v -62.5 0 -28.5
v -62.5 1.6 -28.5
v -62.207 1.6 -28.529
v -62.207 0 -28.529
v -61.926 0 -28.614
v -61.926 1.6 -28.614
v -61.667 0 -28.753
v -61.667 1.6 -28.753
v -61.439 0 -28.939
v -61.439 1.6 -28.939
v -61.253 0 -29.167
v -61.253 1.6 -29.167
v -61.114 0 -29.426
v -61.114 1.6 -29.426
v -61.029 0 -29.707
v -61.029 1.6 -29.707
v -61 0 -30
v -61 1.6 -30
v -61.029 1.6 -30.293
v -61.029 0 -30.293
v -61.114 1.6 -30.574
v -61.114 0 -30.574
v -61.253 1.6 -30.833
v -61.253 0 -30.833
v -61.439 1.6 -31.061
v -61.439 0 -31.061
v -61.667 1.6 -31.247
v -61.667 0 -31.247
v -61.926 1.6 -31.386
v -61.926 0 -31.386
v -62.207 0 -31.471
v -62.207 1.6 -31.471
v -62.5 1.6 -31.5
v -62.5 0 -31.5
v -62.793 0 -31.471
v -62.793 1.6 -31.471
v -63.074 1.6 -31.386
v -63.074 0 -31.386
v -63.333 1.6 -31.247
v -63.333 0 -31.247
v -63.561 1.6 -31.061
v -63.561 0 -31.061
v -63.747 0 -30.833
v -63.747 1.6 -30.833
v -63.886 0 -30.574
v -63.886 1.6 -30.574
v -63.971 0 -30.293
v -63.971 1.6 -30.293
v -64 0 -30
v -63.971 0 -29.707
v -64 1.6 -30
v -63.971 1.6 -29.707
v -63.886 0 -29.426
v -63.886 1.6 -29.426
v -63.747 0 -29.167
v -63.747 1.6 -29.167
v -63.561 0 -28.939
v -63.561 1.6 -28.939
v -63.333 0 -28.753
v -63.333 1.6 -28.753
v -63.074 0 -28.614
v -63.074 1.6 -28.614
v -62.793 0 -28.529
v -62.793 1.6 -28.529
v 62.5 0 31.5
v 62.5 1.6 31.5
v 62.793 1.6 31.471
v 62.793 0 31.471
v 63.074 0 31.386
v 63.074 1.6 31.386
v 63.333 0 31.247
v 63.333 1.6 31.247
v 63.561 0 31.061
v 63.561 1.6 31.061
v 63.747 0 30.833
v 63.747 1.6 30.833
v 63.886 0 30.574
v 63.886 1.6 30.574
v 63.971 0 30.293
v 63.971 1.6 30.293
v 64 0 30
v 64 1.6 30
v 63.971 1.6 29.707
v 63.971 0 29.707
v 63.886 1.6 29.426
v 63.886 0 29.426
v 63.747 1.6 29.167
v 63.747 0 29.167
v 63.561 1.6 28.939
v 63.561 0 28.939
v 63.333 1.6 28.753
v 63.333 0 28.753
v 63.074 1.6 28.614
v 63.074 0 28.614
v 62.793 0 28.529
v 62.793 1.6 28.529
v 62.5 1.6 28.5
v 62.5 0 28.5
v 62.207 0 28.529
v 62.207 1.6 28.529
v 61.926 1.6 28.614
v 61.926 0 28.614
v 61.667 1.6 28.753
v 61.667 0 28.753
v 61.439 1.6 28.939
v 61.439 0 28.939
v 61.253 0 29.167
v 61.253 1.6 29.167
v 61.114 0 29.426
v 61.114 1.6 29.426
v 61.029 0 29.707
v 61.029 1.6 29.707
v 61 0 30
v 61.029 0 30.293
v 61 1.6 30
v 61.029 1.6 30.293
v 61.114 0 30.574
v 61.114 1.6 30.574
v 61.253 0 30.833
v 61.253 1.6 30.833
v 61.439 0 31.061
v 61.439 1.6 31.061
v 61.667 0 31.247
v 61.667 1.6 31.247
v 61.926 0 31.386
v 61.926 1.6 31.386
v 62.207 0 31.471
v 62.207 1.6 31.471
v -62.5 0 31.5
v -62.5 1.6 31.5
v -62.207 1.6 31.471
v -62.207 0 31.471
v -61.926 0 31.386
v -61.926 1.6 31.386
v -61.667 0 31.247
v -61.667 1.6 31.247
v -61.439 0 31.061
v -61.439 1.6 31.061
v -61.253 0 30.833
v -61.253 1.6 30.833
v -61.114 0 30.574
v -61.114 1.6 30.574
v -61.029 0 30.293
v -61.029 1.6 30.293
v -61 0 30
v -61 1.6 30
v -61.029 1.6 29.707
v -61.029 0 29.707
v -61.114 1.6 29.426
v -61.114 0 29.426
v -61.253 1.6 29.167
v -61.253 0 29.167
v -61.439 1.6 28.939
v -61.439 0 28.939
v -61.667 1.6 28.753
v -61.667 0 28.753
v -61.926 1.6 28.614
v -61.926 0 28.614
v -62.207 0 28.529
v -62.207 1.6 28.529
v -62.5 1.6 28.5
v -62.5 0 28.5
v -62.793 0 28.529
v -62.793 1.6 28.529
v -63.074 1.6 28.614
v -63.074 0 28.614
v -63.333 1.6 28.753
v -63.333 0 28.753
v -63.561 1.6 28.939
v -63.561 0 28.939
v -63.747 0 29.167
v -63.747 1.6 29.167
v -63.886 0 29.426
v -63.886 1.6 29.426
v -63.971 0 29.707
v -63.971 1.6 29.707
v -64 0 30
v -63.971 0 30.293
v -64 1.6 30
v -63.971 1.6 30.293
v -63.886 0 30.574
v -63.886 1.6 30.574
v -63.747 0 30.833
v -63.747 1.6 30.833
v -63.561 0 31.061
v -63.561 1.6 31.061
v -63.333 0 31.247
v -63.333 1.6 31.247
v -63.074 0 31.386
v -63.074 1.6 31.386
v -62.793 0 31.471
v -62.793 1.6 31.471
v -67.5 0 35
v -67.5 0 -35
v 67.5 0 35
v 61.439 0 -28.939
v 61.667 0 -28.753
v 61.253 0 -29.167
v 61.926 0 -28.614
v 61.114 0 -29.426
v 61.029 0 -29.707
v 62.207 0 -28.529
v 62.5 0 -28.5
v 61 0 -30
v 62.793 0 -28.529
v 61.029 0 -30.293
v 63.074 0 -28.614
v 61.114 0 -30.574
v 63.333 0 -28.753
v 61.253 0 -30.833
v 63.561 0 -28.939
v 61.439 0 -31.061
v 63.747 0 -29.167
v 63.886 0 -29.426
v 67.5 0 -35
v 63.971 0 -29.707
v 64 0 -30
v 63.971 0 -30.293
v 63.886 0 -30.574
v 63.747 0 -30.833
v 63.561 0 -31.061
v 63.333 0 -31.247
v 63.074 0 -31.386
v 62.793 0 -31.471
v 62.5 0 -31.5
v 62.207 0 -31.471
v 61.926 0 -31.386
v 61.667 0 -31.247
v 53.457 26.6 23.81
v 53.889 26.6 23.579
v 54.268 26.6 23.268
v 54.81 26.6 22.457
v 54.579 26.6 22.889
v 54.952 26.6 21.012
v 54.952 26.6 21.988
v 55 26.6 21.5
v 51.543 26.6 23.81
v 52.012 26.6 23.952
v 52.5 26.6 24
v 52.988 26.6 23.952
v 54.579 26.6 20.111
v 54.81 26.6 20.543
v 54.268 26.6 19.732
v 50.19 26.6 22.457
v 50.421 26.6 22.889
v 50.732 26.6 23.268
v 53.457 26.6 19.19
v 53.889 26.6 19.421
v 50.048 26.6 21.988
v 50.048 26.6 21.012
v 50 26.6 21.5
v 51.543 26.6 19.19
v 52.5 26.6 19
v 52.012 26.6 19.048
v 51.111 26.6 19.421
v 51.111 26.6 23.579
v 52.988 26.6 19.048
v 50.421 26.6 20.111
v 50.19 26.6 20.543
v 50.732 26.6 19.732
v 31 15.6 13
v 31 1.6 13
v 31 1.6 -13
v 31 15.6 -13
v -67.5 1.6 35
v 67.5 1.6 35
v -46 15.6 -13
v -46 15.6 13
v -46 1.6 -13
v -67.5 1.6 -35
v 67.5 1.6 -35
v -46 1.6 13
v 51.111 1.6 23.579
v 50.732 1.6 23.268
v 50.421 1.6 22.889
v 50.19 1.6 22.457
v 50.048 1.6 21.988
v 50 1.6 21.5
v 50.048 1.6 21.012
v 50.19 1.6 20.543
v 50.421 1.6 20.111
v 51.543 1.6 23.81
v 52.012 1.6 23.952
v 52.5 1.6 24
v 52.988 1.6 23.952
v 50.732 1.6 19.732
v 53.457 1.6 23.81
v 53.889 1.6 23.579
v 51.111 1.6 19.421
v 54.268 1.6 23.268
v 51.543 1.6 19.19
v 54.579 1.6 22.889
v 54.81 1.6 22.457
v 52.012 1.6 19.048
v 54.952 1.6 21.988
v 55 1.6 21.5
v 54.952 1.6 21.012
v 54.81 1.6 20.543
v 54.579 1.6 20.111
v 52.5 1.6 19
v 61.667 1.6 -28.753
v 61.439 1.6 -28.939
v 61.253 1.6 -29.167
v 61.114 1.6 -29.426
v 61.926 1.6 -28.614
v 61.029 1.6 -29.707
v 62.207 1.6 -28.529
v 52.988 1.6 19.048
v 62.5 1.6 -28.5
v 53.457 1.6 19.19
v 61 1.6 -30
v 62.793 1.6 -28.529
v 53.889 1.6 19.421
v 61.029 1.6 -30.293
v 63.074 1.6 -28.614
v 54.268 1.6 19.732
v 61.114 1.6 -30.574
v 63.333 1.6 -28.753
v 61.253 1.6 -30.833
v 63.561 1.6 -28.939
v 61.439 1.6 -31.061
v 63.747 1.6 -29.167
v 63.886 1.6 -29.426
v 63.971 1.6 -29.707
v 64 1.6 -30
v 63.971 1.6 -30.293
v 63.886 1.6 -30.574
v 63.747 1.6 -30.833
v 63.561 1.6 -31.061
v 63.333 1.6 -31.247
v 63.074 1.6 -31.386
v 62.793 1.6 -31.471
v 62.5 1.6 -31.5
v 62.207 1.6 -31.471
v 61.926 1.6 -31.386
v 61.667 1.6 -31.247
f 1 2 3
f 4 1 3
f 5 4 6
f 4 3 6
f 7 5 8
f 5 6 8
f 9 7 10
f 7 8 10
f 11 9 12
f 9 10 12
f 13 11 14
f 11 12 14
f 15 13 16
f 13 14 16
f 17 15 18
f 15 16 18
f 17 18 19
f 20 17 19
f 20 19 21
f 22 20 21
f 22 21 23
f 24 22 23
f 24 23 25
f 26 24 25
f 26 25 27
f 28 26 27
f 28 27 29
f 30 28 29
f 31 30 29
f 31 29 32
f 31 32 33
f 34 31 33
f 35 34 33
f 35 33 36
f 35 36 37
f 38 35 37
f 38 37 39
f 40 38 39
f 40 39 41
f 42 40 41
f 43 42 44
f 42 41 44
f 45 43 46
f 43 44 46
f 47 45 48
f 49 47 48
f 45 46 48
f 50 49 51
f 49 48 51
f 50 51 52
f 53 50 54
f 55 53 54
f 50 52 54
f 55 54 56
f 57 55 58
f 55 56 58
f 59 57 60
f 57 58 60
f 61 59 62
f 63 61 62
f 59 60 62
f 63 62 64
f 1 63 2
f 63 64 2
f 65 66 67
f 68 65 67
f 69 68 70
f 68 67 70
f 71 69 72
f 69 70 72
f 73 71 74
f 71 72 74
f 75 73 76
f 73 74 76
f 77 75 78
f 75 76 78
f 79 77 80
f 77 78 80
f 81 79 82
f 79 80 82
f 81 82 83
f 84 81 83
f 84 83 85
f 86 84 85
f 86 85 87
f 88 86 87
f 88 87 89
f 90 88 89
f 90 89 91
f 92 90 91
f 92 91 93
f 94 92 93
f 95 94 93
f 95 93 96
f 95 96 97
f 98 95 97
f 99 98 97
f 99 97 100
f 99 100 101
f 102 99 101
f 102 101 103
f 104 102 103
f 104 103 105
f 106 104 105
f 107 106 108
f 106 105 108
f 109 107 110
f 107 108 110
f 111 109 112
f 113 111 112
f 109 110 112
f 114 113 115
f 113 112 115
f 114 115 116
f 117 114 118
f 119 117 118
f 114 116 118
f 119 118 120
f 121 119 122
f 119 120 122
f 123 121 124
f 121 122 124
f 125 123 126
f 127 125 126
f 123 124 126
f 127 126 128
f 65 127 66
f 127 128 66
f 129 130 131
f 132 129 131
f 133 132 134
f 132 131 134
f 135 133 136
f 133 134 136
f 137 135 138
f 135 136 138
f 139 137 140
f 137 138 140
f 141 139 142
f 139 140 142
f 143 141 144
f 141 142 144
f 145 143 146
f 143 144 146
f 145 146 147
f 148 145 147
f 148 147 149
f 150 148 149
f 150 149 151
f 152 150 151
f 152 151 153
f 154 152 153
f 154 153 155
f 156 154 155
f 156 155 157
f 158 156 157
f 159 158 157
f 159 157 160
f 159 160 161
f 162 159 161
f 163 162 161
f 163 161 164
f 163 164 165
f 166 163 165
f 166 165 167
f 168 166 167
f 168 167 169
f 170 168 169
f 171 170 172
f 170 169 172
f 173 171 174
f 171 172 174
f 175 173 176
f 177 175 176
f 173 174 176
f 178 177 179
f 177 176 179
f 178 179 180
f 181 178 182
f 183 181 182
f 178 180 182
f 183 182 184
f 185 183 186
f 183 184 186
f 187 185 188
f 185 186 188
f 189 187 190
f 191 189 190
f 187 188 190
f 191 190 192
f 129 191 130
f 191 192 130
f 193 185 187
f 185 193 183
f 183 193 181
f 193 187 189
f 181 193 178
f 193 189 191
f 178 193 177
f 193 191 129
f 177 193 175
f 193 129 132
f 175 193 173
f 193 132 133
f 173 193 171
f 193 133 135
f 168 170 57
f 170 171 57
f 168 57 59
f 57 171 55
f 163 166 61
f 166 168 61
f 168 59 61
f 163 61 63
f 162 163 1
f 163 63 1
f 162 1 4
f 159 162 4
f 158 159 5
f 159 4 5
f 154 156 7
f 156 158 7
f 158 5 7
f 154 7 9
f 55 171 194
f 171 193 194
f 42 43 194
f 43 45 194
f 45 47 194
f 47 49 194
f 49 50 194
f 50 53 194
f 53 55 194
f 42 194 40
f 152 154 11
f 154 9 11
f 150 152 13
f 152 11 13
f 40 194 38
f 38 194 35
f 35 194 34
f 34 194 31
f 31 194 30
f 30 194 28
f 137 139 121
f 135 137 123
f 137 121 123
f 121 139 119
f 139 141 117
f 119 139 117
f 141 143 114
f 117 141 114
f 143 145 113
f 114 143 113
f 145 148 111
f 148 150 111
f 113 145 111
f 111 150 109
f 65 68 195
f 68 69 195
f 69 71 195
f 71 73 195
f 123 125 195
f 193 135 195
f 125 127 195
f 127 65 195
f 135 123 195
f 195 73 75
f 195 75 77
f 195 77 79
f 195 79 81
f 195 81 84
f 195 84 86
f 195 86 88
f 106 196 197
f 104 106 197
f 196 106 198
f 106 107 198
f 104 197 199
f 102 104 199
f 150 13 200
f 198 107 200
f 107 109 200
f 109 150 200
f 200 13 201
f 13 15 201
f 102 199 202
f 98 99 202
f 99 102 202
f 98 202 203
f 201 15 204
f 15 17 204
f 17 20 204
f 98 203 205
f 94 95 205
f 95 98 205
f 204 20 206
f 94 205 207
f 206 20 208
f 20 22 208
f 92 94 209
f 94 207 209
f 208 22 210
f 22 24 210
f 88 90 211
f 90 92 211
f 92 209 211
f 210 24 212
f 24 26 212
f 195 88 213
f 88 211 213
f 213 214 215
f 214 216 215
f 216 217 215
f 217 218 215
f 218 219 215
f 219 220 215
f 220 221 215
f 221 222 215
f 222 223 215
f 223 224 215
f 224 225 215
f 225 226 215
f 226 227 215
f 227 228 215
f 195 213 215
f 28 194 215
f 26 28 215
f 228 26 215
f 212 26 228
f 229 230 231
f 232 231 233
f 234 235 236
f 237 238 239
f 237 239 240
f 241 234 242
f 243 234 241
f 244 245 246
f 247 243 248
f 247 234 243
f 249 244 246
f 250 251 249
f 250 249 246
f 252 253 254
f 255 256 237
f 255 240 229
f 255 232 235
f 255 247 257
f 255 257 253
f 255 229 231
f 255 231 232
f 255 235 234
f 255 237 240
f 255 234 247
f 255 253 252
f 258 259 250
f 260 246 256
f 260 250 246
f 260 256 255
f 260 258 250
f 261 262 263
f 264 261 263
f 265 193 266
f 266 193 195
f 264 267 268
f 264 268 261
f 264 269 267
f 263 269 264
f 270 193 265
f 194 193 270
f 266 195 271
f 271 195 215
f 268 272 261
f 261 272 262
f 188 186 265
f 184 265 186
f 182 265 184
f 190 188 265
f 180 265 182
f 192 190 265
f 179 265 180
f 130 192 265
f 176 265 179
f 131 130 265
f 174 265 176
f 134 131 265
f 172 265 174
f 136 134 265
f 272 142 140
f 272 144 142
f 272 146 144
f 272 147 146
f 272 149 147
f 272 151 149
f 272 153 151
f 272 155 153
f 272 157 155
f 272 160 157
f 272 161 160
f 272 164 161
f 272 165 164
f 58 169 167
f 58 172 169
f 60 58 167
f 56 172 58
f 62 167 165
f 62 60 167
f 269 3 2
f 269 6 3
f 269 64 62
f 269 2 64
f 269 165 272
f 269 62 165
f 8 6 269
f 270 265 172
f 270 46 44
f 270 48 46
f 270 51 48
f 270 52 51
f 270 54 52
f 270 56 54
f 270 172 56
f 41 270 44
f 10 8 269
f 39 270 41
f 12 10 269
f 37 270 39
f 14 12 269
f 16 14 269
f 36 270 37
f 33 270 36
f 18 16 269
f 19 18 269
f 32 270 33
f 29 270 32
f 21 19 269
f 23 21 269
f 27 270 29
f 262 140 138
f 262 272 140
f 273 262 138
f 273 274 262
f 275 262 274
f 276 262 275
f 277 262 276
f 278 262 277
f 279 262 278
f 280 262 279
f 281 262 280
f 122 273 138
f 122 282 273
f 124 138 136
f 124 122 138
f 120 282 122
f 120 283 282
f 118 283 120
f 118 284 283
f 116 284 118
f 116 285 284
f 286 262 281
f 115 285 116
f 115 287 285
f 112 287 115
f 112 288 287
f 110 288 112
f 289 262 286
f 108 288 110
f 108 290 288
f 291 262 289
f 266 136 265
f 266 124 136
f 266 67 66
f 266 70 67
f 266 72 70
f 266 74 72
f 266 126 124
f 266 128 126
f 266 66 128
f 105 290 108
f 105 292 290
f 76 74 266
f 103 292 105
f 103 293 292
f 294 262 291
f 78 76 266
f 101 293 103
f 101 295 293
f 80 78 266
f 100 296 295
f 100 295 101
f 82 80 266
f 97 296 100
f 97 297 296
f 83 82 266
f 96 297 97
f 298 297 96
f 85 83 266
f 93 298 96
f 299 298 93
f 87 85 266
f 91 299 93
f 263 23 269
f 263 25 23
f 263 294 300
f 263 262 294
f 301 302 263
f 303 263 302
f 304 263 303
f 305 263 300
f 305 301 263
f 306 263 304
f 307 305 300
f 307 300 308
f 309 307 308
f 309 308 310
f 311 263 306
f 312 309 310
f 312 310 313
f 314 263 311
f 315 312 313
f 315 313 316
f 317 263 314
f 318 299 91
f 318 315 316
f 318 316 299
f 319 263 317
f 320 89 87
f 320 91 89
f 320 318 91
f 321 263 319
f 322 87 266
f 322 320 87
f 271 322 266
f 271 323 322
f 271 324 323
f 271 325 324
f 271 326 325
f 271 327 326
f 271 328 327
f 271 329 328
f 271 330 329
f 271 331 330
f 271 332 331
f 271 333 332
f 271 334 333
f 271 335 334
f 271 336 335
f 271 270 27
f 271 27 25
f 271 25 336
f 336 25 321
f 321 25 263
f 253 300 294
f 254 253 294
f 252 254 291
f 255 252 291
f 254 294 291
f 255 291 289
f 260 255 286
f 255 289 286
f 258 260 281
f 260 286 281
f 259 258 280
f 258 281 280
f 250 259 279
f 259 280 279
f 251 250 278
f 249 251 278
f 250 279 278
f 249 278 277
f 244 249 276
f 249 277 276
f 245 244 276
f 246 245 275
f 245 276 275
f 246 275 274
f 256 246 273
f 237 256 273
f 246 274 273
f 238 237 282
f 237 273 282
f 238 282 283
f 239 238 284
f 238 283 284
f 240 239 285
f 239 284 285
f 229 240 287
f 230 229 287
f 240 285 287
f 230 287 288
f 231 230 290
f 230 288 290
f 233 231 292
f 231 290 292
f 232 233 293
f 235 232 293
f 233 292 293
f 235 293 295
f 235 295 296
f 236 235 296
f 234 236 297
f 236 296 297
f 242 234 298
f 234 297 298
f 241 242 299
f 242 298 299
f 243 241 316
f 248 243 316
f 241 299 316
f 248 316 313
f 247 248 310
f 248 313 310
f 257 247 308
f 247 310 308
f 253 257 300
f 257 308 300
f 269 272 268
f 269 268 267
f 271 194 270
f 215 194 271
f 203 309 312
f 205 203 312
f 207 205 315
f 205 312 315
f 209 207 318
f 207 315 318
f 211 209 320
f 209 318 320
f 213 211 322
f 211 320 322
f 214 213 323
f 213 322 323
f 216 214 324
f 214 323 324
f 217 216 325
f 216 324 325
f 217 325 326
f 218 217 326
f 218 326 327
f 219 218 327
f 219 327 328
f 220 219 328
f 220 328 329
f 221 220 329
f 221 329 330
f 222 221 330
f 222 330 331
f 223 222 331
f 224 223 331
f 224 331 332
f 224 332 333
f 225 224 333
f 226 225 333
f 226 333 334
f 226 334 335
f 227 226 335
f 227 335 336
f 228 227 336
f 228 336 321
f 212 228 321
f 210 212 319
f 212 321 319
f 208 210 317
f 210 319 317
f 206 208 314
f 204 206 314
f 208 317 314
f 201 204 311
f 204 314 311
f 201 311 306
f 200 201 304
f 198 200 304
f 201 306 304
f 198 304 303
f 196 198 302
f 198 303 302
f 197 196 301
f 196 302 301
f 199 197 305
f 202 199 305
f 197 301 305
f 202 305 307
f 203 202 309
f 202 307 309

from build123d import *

# Parameters (mm, degrees)
SKETCH1_W           = 135
SKETCH1_H           = 70
BOSS_EXTRUDE1_DEPTH = 1.6
CUT_EXTRUDE1_REACH  = 78.051
SKETCH2_R           = 1.5
SKETCH3_R           = 2.5
BOSS_EXTRUDE2_DEPTH = 25
SKETCH4_W           = 77
SKETCH4_H           = 26
BOSS_EXTRUDE3_DEPTH = 14


with BuildPart() as part:
    # Sketch1 → Boss-Extrude1 (new body)
    with BuildSketch(Plane(origin=(0, 0, 0), x_dir=(1, 0, 0), z_dir=(0, 1, 0))):
        Rectangle(SKETCH1_W, SKETCH1_H)
    extrude(amount=BOSS_EXTRUDE1_DEPTH)

    # Sketch2 → Cut-Extrude1 (cut, up to next)
    with BuildSketch(Plane(origin=(0, 1.6, 0), x_dir=(1, 0, 0), z_dir=(0, 1, 0)), mode=Mode.PRIVATE) as cut_extrude1_sk1:
        with Locations(Location((62.5, 30, 0), (0, 0, 270))):
            Circle(SKETCH2_R)
    cut_extrude1_tool1 = extrude(cut_extrude1_sk1.sketch, amount=-CUT_EXTRUDE1_REACH, mode=Mode.PRIVATE) & part.part
    # Sketch2 → Cut-Extrude1 (cut, up to next)
    with BuildSketch(Plane(origin=(0, 1.6, 0), x_dir=(1, 0, 0), z_dir=(0, 1, 0)), mode=Mode.PRIVATE) as cut_extrude1_sk2:
        with Locations(Location((-62.5, 30, 0), (0, 0, 270))):
            Circle(SKETCH2_R)
    cut_extrude1_tool2 = extrude(cut_extrude1_sk2.sketch, amount=-CUT_EXTRUDE1_REACH, mode=Mode.PRIVATE) & part.part
    # Sketch2 → Cut-Extrude1 (cut, up to next)
    with BuildSketch(Plane(origin=(0, 1.6, 0), x_dir=(1, 0, 0), z_dir=(0, 1, 0)), mode=Mode.PRIVATE) as cut_extrude1_sk3:
        with Locations(Location((-62.5, -30, 0), (0, 0, 270))):
            Circle(SKETCH2_R)
    cut_extrude1_tool3 = extrude(cut_extrude1_sk3.sketch, amount=-CUT_EXTRUDE1_REACH, mode=Mode.PRIVATE) & part.part
    # Sketch2 → Cut-Extrude1 (cut, up to next)
    with BuildSketch(Plane(origin=(0, 1.6, 0), x_dir=(1, 0, 0), z_dir=(0, 1, 0)), mode=Mode.PRIVATE) as cut_extrude1_sk4:
        with Locations(Location((62.5, -30, 0), (0, 0, 270))):
            Circle(SKETCH2_R)
    cut_extrude1_tool4 = extrude(cut_extrude1_sk4.sketch, amount=-CUT_EXTRUDE1_REACH, mode=Mode.PRIVATE) & part.part
    add(cut_extrude1_tool1.solids().sort_by_distance((62.5, 1.6, -30))[0], mode=Mode.SUBTRACT)
    add(cut_extrude1_tool2.solids().sort_by_distance((-62.5, 1.6, -30))[0], mode=Mode.SUBTRACT)
    add(cut_extrude1_tool3.solids().sort_by_distance((-62.5, 1.6, 30))[0], mode=Mode.SUBTRACT)
    add(cut_extrude1_tool4.solids().sort_by_distance((62.5, 1.6, 30))[0], mode=Mode.SUBTRACT)

    # Sketch3 → Boss-Extrude2 (add)
    with BuildSketch(Plane(origin=(0, 1.6, 0), x_dir=(1, 0, 0), z_dir=(0, 1, 0))):
        with Locations(Location((52.5, -21.5, 0), (0, 0, 90))):
            Circle(SKETCH3_R)
    extrude(amount=BOSS_EXTRUDE2_DEPTH)

    # Sketch4 → Boss-Extrude3 (add)
    with BuildSketch(Plane(origin=(0, 1.6, 0), x_dir=(1, 0, 0), z_dir=(0, 1, 0))):
        with Locations((-7.5, 0)):
            Rectangle(SKETCH4_W, SKETCH4_H)
    extrude(amount=BOSS_EXTRUDE3_DEPTH)


solid = part.part
